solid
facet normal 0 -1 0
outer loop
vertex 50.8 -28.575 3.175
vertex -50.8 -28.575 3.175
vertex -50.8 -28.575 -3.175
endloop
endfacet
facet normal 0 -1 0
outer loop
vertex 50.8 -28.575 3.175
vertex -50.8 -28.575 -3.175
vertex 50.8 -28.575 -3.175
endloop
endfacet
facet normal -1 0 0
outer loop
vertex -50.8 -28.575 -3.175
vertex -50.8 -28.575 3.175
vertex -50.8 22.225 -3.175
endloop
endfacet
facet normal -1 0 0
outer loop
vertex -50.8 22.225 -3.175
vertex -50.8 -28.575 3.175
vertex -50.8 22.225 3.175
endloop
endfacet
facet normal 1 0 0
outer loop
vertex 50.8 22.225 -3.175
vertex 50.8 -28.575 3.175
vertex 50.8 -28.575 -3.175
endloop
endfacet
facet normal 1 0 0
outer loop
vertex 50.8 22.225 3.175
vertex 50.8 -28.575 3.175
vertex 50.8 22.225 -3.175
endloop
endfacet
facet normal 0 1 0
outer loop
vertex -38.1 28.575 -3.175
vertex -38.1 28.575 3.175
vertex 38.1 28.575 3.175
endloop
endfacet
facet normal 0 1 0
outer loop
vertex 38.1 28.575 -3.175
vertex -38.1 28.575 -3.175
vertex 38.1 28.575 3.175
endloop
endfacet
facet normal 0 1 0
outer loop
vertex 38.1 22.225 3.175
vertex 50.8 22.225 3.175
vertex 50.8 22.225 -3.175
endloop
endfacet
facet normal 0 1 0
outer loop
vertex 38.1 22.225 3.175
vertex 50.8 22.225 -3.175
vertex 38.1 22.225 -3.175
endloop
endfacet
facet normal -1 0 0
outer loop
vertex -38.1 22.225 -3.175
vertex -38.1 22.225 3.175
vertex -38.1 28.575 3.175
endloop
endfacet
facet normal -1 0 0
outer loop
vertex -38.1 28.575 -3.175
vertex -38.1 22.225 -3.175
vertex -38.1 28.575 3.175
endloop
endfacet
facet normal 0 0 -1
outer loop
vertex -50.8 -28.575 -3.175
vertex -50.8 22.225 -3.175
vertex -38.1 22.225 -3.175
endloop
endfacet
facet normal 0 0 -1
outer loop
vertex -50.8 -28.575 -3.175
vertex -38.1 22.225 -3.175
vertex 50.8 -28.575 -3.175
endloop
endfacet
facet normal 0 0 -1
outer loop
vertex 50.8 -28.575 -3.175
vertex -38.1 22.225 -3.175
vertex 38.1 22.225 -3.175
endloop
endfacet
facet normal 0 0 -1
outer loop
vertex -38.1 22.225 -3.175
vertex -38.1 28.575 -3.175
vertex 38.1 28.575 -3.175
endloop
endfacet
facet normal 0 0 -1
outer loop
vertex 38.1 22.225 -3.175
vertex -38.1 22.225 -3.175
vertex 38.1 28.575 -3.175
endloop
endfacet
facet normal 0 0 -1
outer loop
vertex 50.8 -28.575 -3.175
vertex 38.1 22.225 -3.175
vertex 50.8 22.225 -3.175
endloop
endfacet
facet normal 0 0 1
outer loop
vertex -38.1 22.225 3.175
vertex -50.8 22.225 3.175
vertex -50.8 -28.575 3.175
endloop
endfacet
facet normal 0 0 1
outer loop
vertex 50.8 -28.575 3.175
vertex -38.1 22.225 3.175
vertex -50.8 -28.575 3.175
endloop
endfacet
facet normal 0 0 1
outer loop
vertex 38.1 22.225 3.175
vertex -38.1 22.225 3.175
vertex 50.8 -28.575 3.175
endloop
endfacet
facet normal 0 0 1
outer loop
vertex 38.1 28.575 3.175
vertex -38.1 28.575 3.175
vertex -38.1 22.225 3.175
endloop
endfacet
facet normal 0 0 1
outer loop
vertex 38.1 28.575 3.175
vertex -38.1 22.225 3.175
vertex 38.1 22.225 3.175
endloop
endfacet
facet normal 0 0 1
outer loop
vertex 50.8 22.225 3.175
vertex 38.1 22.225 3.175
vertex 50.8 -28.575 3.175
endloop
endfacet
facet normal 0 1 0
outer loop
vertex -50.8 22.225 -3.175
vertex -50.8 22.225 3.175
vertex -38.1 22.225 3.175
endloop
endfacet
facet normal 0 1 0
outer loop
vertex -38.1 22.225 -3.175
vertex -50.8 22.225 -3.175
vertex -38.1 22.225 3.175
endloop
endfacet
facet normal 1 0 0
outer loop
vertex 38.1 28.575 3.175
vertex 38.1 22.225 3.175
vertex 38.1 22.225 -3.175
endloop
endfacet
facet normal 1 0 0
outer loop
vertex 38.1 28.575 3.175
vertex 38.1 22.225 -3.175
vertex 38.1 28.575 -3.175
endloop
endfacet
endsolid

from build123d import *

# Parameters (mm, degrees)
SKETCH1_W           = 101.6
SKETCH1_H           = 57.15
BOSS_EXTRUDE1_DEPTH = 3.175
SKETCH2_W           = 12.7
SKETCH2_H           = 6.35
CUT_EXTRUDE1_DEPTH  = 59.630138368


with BuildPart() as part:
    # Sketch1 → Boss-Extrude1 (new, symmetric)
    with BuildSketch(Plane.XY):
        Rectangle(SKETCH1_W, SKETCH1_H)
    extrude(amount=BOSS_EXTRUDE1_DEPTH, both=True)

    # Sketch2 → Cut-Extrude1 (cut, through all)
    with BuildSketch(Plane.XY.offset(3.175)):
        with Locations((-44.45, 25.4)):
            Rectangle(SKETCH2_W, SKETCH2_H)
    cut_extrude1 = extrude(amount=-CUT_EXTRUDE1_DEPTH, mode=Mode.SUBTRACT)

    # Mirror1: Cut-Extrude1 across plane
    add(cut_extrude1.mirror(Plane(origin=(0, 0, 0), x_dir=(0, 0, 1), z_dir=(1, 0, 0))), mode=Mode.SUBTRACT)


solid = part.part
